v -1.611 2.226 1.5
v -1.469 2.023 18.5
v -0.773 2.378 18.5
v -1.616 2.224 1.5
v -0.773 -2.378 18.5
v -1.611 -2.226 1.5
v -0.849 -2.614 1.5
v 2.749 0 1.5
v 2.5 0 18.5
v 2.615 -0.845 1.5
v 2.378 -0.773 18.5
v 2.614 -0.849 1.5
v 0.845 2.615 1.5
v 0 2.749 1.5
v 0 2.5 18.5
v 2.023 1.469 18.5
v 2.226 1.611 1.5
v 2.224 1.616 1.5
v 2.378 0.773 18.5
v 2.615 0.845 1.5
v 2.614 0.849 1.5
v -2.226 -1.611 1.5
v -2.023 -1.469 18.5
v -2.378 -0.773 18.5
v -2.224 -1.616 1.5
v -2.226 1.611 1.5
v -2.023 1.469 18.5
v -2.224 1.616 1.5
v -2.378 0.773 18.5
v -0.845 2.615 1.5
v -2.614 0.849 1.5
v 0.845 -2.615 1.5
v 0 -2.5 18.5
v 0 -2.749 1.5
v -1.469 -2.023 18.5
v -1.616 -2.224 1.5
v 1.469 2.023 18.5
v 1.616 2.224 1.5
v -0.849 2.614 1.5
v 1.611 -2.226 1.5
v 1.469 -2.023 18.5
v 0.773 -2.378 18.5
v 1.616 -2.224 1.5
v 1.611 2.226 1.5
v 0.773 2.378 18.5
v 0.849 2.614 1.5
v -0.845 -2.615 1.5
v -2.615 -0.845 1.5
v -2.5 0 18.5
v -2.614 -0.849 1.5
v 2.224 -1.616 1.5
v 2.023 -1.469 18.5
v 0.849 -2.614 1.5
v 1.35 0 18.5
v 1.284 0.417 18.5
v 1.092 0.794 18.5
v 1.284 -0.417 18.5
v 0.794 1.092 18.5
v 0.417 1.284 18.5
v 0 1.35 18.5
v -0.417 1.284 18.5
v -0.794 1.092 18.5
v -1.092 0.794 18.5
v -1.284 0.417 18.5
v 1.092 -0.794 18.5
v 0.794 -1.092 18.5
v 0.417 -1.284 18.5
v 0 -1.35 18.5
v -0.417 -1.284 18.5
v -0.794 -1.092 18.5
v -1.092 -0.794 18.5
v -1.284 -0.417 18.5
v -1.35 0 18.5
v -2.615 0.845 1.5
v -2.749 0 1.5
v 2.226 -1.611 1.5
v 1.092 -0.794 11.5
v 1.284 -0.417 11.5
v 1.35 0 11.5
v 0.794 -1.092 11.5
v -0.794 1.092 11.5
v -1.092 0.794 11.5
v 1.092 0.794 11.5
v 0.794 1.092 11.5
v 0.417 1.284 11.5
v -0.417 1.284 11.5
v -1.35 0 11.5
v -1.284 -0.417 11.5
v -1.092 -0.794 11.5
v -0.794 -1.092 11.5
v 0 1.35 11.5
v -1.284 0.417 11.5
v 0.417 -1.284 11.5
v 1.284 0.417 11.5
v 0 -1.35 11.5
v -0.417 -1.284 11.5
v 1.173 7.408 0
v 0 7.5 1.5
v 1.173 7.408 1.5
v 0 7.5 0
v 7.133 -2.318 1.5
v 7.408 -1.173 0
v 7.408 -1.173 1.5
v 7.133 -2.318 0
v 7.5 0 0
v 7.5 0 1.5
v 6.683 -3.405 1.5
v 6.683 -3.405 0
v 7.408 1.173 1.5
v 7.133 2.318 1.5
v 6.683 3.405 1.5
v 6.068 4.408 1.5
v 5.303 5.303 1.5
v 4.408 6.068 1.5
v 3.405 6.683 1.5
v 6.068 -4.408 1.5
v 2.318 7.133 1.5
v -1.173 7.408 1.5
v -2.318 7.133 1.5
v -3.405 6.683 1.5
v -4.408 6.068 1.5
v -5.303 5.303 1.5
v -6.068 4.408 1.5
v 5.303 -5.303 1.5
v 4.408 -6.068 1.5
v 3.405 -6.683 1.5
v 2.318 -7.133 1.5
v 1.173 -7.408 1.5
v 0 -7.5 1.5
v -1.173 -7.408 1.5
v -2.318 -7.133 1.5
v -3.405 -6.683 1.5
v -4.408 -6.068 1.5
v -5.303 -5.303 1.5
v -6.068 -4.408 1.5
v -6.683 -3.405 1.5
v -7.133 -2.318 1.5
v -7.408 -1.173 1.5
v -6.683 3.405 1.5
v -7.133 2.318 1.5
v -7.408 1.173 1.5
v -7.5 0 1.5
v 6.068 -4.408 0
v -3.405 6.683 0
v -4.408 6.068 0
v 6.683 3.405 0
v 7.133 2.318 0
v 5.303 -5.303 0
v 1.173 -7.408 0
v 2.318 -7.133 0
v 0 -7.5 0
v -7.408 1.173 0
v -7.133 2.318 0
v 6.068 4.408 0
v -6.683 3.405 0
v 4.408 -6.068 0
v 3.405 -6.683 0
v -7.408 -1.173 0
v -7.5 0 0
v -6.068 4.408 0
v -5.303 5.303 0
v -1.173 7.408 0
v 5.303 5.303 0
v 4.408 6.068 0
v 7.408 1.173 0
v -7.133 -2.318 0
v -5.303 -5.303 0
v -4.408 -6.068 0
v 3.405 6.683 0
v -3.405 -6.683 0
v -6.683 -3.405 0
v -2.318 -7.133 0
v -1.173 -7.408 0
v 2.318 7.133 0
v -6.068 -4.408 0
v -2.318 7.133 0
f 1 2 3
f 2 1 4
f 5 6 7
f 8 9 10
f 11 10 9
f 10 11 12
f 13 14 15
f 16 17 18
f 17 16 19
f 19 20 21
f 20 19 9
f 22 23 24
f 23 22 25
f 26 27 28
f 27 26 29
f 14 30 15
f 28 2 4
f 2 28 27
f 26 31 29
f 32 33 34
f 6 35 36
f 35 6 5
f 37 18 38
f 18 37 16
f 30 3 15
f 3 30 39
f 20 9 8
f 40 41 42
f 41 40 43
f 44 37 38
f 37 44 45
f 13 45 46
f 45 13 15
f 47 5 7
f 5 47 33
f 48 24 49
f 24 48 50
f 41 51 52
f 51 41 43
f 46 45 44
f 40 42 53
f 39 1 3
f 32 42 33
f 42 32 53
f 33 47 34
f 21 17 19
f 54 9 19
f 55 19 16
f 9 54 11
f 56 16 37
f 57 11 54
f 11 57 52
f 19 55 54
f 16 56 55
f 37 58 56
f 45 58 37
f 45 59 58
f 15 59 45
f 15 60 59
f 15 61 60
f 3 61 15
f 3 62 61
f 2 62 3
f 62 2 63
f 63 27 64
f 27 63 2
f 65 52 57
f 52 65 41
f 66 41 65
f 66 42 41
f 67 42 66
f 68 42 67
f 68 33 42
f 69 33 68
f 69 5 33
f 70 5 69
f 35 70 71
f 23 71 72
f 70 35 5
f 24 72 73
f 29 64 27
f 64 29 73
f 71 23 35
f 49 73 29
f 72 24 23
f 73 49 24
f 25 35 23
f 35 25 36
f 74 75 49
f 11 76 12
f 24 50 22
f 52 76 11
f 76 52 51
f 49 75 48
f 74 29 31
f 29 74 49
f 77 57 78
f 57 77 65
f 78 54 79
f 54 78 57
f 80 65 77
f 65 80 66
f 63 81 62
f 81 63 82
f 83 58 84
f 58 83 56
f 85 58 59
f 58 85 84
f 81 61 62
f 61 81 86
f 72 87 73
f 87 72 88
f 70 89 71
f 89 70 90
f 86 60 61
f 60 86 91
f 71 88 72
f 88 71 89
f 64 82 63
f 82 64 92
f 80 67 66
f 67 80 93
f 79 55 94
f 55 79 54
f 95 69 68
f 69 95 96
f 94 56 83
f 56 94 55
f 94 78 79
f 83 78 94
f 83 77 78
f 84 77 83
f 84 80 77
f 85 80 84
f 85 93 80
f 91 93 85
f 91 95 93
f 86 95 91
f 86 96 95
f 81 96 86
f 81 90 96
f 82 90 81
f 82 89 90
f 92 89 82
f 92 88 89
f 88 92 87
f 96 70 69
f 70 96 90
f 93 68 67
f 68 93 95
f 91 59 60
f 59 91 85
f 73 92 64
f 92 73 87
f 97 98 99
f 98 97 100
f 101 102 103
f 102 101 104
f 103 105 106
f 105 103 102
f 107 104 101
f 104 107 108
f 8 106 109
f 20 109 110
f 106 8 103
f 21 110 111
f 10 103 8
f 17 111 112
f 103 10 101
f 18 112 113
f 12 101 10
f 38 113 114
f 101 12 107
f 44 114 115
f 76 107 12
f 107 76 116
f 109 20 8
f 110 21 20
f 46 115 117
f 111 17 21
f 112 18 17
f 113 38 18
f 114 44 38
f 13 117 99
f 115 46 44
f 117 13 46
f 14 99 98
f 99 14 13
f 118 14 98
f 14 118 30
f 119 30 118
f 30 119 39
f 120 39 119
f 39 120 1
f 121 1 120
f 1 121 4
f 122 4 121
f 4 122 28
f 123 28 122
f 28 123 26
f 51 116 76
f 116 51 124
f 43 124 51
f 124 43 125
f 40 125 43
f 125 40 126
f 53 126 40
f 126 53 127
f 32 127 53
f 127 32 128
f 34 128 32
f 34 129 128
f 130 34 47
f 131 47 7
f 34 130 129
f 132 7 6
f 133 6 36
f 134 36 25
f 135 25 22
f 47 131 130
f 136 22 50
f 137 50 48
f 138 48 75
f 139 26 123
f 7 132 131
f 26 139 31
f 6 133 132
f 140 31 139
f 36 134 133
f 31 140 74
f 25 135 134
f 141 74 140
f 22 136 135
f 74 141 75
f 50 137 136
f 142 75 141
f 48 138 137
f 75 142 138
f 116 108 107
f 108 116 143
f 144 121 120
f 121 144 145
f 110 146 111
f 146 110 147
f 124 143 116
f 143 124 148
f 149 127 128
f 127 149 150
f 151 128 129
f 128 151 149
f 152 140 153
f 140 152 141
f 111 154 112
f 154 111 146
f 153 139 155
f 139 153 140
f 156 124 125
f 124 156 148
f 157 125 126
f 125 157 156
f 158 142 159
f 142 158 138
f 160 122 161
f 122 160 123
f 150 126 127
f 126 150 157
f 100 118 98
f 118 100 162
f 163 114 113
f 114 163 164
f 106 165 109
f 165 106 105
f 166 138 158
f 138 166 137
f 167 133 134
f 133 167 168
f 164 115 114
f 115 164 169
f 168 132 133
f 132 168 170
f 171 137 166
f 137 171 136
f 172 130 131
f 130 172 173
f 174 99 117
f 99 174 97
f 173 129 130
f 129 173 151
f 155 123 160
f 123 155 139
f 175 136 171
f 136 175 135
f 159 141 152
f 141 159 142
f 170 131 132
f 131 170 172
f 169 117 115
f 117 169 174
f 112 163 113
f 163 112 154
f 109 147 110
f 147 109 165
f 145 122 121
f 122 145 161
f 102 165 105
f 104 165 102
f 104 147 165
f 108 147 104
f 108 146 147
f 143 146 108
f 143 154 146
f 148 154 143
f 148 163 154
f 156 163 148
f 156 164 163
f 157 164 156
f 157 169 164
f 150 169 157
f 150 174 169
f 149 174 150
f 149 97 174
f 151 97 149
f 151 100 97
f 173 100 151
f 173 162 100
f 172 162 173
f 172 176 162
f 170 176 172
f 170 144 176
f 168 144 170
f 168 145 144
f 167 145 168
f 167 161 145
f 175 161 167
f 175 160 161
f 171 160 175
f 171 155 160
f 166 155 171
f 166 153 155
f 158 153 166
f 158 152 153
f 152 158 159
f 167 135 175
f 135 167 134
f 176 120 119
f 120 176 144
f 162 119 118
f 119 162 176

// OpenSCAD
axle_inner_diam = 2.7;
axle_outer_diam = 5;
axle_outer_top_diam = 5.5;
axle_length = 17;

top_diam = 15;
top_thickness = 1.5;
top_washer_diam = 12;
top_washer_thickness = 0.5;

module corn_holder() {
	render() difference() {
		cylinder(d1=axle_outer_diam, d2=axle_outer_top_diam, h=axle_length+0.1, $fn=20);
		cylinder(d=axle_inner_diam, h=7, $fn=20); 
	}
	translate([0 , 0, axle_length]) { 
		render() difference() {
			cylinder(d=top_diam, h=top_thickness,$fn=40);
			//translate([0,0,top_thickness-top_washer_thickness]) cylinder(d=top_washer_diam, h=top_washer_thickness,$fn=40);
		}
	}
}

rotate([180,0,0]) translate([0,0,-axle_length-top_thickness]) corn_holder();
